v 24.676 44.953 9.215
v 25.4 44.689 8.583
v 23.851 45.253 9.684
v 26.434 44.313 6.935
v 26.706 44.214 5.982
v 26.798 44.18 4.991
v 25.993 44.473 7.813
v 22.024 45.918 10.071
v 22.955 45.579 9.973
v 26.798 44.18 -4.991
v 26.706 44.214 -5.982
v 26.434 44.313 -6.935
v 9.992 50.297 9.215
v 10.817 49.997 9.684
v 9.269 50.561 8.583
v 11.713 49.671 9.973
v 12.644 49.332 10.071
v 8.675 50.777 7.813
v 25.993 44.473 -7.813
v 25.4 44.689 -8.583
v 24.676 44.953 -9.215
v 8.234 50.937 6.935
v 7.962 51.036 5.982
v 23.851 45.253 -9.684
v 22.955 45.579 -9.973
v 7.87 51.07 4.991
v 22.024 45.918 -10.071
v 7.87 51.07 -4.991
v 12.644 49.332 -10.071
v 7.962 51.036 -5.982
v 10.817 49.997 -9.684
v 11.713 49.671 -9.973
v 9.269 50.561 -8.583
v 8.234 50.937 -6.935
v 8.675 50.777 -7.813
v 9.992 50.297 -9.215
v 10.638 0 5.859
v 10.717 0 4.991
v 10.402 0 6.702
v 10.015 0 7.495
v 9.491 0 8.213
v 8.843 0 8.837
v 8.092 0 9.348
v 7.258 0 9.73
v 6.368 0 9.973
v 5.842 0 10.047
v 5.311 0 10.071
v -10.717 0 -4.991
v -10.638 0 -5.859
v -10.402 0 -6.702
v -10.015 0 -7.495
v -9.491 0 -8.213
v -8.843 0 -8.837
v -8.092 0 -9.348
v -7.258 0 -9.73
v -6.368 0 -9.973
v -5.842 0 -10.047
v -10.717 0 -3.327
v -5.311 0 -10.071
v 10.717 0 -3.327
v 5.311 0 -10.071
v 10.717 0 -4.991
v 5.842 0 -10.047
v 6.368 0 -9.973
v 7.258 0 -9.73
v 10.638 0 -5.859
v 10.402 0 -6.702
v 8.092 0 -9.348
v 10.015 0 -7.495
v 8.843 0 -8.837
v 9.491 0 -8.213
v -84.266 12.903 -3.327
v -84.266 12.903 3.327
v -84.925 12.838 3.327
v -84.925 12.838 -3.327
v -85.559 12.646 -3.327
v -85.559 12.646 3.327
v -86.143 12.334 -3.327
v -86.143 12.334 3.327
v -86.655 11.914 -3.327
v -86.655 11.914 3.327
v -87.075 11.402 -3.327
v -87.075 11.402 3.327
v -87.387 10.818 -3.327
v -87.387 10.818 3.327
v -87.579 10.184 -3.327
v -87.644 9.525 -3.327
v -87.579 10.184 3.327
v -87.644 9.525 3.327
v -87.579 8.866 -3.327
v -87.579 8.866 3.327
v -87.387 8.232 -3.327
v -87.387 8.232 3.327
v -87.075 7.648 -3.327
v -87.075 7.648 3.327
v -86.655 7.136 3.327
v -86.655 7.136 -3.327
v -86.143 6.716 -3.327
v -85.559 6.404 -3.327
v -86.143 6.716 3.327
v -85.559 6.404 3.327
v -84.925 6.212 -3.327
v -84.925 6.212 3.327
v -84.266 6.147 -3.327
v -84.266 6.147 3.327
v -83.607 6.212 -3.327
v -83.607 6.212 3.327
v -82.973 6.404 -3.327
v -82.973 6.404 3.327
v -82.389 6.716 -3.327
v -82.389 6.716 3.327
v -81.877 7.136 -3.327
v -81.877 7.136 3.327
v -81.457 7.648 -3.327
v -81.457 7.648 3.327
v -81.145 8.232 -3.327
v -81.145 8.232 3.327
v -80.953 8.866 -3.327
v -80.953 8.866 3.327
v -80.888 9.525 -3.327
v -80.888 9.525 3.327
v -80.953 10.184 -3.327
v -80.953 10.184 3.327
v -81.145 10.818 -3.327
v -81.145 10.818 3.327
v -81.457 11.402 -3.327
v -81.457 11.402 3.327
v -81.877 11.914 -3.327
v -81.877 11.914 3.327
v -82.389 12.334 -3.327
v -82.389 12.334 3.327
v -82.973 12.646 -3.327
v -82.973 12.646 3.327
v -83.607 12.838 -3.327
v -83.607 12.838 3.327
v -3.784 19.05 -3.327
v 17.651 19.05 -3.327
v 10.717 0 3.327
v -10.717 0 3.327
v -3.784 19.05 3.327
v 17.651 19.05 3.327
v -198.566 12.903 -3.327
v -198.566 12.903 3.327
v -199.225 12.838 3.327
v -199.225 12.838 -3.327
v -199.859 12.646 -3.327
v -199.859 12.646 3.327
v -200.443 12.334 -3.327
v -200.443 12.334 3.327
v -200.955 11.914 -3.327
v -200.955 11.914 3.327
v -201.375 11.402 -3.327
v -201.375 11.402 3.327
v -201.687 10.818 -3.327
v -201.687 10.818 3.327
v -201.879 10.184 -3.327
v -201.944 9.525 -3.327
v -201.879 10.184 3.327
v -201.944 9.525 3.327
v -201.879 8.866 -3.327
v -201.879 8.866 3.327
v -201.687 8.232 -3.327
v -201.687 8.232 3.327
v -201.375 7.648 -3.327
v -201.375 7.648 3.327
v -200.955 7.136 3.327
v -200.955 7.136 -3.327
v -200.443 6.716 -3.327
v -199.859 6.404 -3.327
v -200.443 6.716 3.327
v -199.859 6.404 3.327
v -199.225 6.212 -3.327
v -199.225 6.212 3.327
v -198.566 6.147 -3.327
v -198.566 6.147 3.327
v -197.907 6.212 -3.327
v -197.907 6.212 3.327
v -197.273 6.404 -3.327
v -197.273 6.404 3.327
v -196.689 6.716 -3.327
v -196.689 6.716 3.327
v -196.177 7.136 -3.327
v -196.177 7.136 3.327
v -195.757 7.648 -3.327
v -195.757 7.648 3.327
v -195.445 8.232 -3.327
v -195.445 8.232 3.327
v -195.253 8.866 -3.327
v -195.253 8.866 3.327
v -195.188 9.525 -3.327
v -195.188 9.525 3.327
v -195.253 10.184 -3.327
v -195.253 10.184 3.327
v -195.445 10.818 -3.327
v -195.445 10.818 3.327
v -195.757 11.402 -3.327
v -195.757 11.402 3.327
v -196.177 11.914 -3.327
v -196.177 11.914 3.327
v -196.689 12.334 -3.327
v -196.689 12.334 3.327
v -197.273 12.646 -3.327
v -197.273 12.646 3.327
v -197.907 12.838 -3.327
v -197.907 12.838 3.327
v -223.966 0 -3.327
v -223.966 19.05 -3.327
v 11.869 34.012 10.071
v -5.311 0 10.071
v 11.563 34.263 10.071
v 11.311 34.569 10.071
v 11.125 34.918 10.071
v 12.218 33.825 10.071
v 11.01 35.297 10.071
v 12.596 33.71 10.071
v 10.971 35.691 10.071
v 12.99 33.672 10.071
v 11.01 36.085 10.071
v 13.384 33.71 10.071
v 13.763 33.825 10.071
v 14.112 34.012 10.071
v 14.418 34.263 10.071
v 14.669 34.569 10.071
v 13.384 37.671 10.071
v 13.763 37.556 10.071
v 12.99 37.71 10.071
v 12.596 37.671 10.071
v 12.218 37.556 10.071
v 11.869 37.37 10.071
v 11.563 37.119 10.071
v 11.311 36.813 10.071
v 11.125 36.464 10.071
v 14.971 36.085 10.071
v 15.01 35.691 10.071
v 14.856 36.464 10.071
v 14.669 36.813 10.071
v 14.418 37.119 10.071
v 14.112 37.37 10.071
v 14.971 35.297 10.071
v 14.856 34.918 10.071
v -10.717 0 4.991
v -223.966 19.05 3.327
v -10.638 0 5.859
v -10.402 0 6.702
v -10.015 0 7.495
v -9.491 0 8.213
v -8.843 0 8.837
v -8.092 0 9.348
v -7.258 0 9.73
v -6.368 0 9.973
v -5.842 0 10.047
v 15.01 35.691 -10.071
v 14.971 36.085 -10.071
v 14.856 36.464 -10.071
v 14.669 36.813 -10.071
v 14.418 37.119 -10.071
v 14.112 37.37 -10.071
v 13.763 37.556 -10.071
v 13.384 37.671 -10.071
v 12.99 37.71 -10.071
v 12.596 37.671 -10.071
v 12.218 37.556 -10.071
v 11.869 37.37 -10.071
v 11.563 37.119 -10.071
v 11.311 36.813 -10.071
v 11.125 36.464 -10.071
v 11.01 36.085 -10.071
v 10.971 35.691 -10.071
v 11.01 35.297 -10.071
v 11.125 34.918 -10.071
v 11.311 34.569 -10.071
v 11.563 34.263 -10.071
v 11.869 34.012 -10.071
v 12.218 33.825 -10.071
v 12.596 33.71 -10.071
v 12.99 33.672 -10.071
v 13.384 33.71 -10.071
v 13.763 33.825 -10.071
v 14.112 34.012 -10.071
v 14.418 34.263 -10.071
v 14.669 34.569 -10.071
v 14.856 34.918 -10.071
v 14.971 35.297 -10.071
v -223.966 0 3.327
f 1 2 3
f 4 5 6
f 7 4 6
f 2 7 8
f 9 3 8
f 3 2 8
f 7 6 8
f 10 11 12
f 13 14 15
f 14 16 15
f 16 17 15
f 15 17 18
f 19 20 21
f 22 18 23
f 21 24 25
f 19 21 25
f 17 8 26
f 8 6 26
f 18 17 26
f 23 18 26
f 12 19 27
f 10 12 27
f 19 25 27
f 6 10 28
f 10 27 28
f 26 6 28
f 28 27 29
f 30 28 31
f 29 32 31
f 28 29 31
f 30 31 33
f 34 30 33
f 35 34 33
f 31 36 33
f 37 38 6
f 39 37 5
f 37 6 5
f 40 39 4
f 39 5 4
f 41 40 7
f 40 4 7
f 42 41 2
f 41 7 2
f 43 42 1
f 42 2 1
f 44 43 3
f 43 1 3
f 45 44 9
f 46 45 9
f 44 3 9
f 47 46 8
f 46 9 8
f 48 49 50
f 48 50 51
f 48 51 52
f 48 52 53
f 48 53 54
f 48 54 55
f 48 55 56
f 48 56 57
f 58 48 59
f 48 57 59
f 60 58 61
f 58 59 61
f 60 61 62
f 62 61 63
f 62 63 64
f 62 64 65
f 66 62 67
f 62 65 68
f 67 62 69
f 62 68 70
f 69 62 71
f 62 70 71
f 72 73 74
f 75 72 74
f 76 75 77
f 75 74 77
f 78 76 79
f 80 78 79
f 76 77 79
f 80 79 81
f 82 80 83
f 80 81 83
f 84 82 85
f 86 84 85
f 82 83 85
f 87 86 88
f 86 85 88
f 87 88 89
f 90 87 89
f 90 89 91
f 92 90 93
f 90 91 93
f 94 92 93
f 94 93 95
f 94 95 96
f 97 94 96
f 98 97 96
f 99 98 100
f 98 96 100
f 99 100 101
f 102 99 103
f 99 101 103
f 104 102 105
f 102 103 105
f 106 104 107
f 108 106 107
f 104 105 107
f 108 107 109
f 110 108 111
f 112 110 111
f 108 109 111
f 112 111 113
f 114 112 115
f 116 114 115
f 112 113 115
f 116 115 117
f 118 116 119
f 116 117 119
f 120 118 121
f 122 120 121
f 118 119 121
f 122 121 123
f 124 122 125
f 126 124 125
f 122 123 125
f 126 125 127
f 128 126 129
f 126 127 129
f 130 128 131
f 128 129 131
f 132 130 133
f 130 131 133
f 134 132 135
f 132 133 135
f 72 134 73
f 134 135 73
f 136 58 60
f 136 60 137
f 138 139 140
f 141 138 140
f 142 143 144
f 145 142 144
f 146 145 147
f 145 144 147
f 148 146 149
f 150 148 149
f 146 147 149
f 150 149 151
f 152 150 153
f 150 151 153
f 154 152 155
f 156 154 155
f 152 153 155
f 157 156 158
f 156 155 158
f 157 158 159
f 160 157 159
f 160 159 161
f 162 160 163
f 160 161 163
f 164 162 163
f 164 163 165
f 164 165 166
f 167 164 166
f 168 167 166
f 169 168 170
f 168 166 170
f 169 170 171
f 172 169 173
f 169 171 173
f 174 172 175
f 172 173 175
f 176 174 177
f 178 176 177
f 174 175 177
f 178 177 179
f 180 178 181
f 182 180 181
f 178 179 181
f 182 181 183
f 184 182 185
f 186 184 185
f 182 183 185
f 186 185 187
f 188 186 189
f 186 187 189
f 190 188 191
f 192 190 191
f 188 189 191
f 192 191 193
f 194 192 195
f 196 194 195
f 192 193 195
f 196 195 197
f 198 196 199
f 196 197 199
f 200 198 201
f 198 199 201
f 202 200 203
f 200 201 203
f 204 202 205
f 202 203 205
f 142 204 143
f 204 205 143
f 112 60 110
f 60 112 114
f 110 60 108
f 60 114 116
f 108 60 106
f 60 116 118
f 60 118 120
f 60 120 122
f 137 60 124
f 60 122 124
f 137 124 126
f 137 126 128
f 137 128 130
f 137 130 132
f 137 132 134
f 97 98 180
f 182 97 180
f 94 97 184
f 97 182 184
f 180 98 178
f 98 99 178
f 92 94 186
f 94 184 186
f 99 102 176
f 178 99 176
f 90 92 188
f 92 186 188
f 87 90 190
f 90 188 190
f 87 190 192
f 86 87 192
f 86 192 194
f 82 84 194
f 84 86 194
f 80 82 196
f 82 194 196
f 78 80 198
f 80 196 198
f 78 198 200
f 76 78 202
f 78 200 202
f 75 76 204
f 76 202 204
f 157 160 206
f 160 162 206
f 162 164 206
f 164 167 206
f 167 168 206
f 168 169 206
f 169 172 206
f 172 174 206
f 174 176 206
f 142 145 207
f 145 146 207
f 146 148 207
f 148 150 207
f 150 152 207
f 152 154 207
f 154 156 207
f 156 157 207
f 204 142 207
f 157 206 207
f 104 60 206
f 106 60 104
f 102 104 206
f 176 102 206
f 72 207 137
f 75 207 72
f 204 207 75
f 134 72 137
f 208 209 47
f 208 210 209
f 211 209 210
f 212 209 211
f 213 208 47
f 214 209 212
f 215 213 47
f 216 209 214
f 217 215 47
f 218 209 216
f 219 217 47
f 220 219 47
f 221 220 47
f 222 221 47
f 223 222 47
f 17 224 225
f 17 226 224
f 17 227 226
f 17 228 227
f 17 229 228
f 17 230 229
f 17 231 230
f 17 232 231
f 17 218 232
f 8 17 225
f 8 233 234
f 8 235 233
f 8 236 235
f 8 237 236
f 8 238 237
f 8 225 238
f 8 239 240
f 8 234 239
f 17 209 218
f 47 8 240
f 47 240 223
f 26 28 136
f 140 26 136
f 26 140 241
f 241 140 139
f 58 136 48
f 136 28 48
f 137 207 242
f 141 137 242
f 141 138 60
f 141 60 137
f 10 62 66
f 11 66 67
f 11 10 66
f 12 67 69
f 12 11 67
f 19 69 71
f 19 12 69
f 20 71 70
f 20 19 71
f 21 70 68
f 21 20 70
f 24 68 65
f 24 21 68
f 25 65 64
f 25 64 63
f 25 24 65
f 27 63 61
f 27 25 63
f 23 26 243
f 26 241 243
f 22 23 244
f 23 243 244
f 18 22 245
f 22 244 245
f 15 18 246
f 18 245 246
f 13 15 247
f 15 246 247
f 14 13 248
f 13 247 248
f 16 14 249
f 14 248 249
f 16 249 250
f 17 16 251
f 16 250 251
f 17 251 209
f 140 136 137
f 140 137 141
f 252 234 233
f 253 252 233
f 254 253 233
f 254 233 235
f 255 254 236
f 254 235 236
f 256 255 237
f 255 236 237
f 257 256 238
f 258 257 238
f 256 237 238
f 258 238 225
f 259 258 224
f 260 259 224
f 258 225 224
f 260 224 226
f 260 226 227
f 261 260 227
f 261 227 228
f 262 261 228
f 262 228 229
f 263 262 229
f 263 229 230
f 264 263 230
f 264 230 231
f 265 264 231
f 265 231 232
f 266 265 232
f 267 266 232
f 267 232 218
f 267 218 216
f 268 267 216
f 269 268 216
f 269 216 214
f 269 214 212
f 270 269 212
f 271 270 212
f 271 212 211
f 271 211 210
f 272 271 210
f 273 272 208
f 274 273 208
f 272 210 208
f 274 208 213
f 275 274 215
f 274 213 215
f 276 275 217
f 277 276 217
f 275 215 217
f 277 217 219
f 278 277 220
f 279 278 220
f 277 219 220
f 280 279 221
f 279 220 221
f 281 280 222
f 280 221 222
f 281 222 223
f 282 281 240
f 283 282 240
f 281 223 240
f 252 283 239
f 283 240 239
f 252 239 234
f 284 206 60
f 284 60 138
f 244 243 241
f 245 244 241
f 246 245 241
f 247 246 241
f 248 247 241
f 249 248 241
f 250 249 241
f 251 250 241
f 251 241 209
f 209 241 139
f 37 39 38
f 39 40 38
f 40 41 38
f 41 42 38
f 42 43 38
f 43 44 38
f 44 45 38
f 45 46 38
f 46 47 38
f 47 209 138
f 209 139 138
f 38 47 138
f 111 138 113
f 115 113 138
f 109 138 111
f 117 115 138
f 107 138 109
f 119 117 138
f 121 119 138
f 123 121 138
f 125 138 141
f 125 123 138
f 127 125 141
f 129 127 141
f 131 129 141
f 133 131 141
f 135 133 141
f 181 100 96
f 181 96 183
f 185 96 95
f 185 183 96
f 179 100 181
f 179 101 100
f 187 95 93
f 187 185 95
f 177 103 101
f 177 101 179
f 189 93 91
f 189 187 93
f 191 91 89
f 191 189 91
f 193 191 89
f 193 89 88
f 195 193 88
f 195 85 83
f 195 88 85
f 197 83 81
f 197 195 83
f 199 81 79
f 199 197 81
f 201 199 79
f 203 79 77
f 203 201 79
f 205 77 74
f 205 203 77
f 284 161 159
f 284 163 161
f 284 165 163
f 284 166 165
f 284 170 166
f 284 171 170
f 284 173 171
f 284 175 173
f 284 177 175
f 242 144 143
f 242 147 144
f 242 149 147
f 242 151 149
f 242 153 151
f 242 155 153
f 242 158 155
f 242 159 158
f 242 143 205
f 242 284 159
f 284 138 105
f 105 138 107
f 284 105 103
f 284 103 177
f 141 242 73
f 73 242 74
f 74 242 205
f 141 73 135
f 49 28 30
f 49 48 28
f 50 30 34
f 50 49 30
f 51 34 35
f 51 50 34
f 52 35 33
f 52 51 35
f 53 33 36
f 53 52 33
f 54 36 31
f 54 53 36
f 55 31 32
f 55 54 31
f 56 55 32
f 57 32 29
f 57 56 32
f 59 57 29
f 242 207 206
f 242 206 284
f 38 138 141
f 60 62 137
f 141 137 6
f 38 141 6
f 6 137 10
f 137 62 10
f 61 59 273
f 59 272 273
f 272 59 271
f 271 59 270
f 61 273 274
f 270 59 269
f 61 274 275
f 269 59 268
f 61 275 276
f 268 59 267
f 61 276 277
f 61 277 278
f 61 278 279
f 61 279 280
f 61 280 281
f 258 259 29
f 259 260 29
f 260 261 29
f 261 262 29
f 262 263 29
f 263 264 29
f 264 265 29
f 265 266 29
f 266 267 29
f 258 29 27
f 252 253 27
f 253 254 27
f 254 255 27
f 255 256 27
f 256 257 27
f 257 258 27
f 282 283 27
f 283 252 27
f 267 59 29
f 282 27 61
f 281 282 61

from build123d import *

# Parameters (mm, degrees)
BOSS_EXTRUDE2_REACH              = 81.995
SKETCH9_W                        = 20.1422
SKETCH9_H                        = 20.1422
F_10_32_TAPPED_HOLE1_D           = 4.0386
CUT_EXTRUDE2_REACH               = 260.624
SKETCH11_W                       = 6.6548
SKETCH11_H                       = 19.05
FILLET1_R                        = 5.08
BOSS_EXTRUDE3_REACH              = 260.624
SKETCH11_2_W                     = 6.6548
SKETCH11_2_H                     = 19.05
SKETCH17_W                       = 3.3782
SKETCH17_H                       = 13.3985
F_1_4_CLEARANCE_HOLE1_AT_2_COUNT = 2
F_1_4_CLEARANCE_HOLE1_AT_2_PITCH = 114.3


with BuildPart() as part:
    # Boss-Extrude2: up to this plane
    boss_extrude2_end = Plane(origin=(0, 0, 0), z_dir=(0, 1, 0))
    # Sketch9 → Boss-Extrude2 (new, up to the surface)
    with BuildSketch(Plane(origin=(17.334082407, 47.625, 0), x_dir=(0.939692620785907, -0.34202014332567254, 0), z_dir=(0.34202014332567254, 0.939692620785907, 0)), mode=Mode.PRIVATE) as boss_extrude2_sk1:
        Rectangle(SKETCH9_W, SKETCH9_H)
    boss_extrude2_tool1 = split(extrude(boss_extrude2_sk1.sketch, amount=-BOSS_EXTRUDE2_REACH, mode=Mode.PRIVATE), bisect_by=boss_extrude2_end, keep=Keep.BOTH, mode=Mode.PRIVATE)
    add(boss_extrude2_tool1.solids().sort_by_distance((17.334082, 47.625, 0))[0])

    # #10-32 Tapped Hole1 (through all)
    with Locations(Plane(origin=(0, 0, -10.0711), x_dir=(-1, 0, 0), z_dir=(0, 0, -1))):
        with Locations((-12.990426587, 35.690903716)):
            Hole(F_10_32_TAPPED_HOLE1_D / 2)

    # Cut-Extrude2: up to this plane
    cut_extrude2_end = Plane(origin=(-0.591461061, -31.070952403, -10.0711), z_dir=(0.939692620785907, -0.34202014332567254, 0))
    # Sketch11 → Cut-Extrude2 (cut, up to the surface)
    with BuildSketch(Plane.ZY.offset(223.965917593), mode=Mode.PRIVATE) as cut_extrude2_sk1:
        with Locations((0, 9.525)):
            Rectangle(SKETCH11_W, SKETCH11_H)
    cut_extrude2_tool1 = split(extrude(cut_extrude2_sk1.sketch, amount=-CUT_EXTRUDE2_REACH, mode=Mode.PRIVATE), bisect_by=cut_extrude2_end, keep=Keep.BOTH, mode=Mode.PRIVATE)
    add(cut_extrude2_tool1.solids().sort_by_distance((-223.965918, 9.525, 0))[0], mode=Mode.SUBTRACT)

    # Fillet1
    fillet1_edges = [part.edges().sort_by_distance(p)[0] for p in [
        (18.757630762, 22.090240467, 10.0711),
        (-1.423548355, 25.534759533, 10.0711),
        (-1.423548355, 25.534759533, -10.0711),
        (18.757630762, 22.090240467, -10.0711),
    ]]
    fillet(fillet1_edges, radius=FILLET1_R)


with BuildPart() as body_2:
    # Boss-Extrude3: up to this plane
    boss_extrude3_end = Plane(origin=(-0.591461061, -31.070952403, -10.0711), z_dir=(0.939692620785907, -0.34202014332567254, 0))
    # Sketch11<2> → Boss-Extrude3 (new, up to the surface)
    with BuildSketch(Plane.ZY.offset(223.965917593), mode=Mode.PRIVATE) as boss_extrude3_sk1:
        with Locations((0, 9.525)):
            Rectangle(SKETCH11_2_W, SKETCH11_2_H)
    boss_extrude3_tool1 = split(extrude(boss_extrude3_sk1.sketch, amount=-BOSS_EXTRUDE3_REACH, mode=Mode.PRIVATE), bisect_by=boss_extrude3_end, keep=Keep.BOTH, mode=Mode.PRIVATE)
    add(boss_extrude3_tool1.solids().sort_by_distance((-223.965918, 9.525, 0))[0])

    # Sketch17 → 1/4 Clearance Hole1 (revolve, cut)
    with BuildSketch(Plane(origin=(-84.265917593, 9.525, -3.3274), x_dir=(0, 1, 0), z_dir=(1, 0, 0))):
        with Locations((1.6891, 6.69925)):
            Rectangle(SKETCH17_W, SKETCH17_H)
    f_1_4_clearance_hole1 = revolve(axis=Axis((-84.265917593, 9.525, -9.6774), (0, 0, 1)), mode=Mode.SUBTRACT)

    # 1/4 Clearance Hole1 at 2: 1/4 Clearance Hole1 ×2
    with Locations(*[(-i * F_1_4_CLEARANCE_HOLE1_AT_2_PITCH, 0, 0) for i in range(1, F_1_4_CLEARANCE_HOLE1_AT_2_COUNT)]):
        add(f_1_4_clearance_hole1, mode=Mode.SUBTRACT)


solid = Compound([part.part, body_2.part])
